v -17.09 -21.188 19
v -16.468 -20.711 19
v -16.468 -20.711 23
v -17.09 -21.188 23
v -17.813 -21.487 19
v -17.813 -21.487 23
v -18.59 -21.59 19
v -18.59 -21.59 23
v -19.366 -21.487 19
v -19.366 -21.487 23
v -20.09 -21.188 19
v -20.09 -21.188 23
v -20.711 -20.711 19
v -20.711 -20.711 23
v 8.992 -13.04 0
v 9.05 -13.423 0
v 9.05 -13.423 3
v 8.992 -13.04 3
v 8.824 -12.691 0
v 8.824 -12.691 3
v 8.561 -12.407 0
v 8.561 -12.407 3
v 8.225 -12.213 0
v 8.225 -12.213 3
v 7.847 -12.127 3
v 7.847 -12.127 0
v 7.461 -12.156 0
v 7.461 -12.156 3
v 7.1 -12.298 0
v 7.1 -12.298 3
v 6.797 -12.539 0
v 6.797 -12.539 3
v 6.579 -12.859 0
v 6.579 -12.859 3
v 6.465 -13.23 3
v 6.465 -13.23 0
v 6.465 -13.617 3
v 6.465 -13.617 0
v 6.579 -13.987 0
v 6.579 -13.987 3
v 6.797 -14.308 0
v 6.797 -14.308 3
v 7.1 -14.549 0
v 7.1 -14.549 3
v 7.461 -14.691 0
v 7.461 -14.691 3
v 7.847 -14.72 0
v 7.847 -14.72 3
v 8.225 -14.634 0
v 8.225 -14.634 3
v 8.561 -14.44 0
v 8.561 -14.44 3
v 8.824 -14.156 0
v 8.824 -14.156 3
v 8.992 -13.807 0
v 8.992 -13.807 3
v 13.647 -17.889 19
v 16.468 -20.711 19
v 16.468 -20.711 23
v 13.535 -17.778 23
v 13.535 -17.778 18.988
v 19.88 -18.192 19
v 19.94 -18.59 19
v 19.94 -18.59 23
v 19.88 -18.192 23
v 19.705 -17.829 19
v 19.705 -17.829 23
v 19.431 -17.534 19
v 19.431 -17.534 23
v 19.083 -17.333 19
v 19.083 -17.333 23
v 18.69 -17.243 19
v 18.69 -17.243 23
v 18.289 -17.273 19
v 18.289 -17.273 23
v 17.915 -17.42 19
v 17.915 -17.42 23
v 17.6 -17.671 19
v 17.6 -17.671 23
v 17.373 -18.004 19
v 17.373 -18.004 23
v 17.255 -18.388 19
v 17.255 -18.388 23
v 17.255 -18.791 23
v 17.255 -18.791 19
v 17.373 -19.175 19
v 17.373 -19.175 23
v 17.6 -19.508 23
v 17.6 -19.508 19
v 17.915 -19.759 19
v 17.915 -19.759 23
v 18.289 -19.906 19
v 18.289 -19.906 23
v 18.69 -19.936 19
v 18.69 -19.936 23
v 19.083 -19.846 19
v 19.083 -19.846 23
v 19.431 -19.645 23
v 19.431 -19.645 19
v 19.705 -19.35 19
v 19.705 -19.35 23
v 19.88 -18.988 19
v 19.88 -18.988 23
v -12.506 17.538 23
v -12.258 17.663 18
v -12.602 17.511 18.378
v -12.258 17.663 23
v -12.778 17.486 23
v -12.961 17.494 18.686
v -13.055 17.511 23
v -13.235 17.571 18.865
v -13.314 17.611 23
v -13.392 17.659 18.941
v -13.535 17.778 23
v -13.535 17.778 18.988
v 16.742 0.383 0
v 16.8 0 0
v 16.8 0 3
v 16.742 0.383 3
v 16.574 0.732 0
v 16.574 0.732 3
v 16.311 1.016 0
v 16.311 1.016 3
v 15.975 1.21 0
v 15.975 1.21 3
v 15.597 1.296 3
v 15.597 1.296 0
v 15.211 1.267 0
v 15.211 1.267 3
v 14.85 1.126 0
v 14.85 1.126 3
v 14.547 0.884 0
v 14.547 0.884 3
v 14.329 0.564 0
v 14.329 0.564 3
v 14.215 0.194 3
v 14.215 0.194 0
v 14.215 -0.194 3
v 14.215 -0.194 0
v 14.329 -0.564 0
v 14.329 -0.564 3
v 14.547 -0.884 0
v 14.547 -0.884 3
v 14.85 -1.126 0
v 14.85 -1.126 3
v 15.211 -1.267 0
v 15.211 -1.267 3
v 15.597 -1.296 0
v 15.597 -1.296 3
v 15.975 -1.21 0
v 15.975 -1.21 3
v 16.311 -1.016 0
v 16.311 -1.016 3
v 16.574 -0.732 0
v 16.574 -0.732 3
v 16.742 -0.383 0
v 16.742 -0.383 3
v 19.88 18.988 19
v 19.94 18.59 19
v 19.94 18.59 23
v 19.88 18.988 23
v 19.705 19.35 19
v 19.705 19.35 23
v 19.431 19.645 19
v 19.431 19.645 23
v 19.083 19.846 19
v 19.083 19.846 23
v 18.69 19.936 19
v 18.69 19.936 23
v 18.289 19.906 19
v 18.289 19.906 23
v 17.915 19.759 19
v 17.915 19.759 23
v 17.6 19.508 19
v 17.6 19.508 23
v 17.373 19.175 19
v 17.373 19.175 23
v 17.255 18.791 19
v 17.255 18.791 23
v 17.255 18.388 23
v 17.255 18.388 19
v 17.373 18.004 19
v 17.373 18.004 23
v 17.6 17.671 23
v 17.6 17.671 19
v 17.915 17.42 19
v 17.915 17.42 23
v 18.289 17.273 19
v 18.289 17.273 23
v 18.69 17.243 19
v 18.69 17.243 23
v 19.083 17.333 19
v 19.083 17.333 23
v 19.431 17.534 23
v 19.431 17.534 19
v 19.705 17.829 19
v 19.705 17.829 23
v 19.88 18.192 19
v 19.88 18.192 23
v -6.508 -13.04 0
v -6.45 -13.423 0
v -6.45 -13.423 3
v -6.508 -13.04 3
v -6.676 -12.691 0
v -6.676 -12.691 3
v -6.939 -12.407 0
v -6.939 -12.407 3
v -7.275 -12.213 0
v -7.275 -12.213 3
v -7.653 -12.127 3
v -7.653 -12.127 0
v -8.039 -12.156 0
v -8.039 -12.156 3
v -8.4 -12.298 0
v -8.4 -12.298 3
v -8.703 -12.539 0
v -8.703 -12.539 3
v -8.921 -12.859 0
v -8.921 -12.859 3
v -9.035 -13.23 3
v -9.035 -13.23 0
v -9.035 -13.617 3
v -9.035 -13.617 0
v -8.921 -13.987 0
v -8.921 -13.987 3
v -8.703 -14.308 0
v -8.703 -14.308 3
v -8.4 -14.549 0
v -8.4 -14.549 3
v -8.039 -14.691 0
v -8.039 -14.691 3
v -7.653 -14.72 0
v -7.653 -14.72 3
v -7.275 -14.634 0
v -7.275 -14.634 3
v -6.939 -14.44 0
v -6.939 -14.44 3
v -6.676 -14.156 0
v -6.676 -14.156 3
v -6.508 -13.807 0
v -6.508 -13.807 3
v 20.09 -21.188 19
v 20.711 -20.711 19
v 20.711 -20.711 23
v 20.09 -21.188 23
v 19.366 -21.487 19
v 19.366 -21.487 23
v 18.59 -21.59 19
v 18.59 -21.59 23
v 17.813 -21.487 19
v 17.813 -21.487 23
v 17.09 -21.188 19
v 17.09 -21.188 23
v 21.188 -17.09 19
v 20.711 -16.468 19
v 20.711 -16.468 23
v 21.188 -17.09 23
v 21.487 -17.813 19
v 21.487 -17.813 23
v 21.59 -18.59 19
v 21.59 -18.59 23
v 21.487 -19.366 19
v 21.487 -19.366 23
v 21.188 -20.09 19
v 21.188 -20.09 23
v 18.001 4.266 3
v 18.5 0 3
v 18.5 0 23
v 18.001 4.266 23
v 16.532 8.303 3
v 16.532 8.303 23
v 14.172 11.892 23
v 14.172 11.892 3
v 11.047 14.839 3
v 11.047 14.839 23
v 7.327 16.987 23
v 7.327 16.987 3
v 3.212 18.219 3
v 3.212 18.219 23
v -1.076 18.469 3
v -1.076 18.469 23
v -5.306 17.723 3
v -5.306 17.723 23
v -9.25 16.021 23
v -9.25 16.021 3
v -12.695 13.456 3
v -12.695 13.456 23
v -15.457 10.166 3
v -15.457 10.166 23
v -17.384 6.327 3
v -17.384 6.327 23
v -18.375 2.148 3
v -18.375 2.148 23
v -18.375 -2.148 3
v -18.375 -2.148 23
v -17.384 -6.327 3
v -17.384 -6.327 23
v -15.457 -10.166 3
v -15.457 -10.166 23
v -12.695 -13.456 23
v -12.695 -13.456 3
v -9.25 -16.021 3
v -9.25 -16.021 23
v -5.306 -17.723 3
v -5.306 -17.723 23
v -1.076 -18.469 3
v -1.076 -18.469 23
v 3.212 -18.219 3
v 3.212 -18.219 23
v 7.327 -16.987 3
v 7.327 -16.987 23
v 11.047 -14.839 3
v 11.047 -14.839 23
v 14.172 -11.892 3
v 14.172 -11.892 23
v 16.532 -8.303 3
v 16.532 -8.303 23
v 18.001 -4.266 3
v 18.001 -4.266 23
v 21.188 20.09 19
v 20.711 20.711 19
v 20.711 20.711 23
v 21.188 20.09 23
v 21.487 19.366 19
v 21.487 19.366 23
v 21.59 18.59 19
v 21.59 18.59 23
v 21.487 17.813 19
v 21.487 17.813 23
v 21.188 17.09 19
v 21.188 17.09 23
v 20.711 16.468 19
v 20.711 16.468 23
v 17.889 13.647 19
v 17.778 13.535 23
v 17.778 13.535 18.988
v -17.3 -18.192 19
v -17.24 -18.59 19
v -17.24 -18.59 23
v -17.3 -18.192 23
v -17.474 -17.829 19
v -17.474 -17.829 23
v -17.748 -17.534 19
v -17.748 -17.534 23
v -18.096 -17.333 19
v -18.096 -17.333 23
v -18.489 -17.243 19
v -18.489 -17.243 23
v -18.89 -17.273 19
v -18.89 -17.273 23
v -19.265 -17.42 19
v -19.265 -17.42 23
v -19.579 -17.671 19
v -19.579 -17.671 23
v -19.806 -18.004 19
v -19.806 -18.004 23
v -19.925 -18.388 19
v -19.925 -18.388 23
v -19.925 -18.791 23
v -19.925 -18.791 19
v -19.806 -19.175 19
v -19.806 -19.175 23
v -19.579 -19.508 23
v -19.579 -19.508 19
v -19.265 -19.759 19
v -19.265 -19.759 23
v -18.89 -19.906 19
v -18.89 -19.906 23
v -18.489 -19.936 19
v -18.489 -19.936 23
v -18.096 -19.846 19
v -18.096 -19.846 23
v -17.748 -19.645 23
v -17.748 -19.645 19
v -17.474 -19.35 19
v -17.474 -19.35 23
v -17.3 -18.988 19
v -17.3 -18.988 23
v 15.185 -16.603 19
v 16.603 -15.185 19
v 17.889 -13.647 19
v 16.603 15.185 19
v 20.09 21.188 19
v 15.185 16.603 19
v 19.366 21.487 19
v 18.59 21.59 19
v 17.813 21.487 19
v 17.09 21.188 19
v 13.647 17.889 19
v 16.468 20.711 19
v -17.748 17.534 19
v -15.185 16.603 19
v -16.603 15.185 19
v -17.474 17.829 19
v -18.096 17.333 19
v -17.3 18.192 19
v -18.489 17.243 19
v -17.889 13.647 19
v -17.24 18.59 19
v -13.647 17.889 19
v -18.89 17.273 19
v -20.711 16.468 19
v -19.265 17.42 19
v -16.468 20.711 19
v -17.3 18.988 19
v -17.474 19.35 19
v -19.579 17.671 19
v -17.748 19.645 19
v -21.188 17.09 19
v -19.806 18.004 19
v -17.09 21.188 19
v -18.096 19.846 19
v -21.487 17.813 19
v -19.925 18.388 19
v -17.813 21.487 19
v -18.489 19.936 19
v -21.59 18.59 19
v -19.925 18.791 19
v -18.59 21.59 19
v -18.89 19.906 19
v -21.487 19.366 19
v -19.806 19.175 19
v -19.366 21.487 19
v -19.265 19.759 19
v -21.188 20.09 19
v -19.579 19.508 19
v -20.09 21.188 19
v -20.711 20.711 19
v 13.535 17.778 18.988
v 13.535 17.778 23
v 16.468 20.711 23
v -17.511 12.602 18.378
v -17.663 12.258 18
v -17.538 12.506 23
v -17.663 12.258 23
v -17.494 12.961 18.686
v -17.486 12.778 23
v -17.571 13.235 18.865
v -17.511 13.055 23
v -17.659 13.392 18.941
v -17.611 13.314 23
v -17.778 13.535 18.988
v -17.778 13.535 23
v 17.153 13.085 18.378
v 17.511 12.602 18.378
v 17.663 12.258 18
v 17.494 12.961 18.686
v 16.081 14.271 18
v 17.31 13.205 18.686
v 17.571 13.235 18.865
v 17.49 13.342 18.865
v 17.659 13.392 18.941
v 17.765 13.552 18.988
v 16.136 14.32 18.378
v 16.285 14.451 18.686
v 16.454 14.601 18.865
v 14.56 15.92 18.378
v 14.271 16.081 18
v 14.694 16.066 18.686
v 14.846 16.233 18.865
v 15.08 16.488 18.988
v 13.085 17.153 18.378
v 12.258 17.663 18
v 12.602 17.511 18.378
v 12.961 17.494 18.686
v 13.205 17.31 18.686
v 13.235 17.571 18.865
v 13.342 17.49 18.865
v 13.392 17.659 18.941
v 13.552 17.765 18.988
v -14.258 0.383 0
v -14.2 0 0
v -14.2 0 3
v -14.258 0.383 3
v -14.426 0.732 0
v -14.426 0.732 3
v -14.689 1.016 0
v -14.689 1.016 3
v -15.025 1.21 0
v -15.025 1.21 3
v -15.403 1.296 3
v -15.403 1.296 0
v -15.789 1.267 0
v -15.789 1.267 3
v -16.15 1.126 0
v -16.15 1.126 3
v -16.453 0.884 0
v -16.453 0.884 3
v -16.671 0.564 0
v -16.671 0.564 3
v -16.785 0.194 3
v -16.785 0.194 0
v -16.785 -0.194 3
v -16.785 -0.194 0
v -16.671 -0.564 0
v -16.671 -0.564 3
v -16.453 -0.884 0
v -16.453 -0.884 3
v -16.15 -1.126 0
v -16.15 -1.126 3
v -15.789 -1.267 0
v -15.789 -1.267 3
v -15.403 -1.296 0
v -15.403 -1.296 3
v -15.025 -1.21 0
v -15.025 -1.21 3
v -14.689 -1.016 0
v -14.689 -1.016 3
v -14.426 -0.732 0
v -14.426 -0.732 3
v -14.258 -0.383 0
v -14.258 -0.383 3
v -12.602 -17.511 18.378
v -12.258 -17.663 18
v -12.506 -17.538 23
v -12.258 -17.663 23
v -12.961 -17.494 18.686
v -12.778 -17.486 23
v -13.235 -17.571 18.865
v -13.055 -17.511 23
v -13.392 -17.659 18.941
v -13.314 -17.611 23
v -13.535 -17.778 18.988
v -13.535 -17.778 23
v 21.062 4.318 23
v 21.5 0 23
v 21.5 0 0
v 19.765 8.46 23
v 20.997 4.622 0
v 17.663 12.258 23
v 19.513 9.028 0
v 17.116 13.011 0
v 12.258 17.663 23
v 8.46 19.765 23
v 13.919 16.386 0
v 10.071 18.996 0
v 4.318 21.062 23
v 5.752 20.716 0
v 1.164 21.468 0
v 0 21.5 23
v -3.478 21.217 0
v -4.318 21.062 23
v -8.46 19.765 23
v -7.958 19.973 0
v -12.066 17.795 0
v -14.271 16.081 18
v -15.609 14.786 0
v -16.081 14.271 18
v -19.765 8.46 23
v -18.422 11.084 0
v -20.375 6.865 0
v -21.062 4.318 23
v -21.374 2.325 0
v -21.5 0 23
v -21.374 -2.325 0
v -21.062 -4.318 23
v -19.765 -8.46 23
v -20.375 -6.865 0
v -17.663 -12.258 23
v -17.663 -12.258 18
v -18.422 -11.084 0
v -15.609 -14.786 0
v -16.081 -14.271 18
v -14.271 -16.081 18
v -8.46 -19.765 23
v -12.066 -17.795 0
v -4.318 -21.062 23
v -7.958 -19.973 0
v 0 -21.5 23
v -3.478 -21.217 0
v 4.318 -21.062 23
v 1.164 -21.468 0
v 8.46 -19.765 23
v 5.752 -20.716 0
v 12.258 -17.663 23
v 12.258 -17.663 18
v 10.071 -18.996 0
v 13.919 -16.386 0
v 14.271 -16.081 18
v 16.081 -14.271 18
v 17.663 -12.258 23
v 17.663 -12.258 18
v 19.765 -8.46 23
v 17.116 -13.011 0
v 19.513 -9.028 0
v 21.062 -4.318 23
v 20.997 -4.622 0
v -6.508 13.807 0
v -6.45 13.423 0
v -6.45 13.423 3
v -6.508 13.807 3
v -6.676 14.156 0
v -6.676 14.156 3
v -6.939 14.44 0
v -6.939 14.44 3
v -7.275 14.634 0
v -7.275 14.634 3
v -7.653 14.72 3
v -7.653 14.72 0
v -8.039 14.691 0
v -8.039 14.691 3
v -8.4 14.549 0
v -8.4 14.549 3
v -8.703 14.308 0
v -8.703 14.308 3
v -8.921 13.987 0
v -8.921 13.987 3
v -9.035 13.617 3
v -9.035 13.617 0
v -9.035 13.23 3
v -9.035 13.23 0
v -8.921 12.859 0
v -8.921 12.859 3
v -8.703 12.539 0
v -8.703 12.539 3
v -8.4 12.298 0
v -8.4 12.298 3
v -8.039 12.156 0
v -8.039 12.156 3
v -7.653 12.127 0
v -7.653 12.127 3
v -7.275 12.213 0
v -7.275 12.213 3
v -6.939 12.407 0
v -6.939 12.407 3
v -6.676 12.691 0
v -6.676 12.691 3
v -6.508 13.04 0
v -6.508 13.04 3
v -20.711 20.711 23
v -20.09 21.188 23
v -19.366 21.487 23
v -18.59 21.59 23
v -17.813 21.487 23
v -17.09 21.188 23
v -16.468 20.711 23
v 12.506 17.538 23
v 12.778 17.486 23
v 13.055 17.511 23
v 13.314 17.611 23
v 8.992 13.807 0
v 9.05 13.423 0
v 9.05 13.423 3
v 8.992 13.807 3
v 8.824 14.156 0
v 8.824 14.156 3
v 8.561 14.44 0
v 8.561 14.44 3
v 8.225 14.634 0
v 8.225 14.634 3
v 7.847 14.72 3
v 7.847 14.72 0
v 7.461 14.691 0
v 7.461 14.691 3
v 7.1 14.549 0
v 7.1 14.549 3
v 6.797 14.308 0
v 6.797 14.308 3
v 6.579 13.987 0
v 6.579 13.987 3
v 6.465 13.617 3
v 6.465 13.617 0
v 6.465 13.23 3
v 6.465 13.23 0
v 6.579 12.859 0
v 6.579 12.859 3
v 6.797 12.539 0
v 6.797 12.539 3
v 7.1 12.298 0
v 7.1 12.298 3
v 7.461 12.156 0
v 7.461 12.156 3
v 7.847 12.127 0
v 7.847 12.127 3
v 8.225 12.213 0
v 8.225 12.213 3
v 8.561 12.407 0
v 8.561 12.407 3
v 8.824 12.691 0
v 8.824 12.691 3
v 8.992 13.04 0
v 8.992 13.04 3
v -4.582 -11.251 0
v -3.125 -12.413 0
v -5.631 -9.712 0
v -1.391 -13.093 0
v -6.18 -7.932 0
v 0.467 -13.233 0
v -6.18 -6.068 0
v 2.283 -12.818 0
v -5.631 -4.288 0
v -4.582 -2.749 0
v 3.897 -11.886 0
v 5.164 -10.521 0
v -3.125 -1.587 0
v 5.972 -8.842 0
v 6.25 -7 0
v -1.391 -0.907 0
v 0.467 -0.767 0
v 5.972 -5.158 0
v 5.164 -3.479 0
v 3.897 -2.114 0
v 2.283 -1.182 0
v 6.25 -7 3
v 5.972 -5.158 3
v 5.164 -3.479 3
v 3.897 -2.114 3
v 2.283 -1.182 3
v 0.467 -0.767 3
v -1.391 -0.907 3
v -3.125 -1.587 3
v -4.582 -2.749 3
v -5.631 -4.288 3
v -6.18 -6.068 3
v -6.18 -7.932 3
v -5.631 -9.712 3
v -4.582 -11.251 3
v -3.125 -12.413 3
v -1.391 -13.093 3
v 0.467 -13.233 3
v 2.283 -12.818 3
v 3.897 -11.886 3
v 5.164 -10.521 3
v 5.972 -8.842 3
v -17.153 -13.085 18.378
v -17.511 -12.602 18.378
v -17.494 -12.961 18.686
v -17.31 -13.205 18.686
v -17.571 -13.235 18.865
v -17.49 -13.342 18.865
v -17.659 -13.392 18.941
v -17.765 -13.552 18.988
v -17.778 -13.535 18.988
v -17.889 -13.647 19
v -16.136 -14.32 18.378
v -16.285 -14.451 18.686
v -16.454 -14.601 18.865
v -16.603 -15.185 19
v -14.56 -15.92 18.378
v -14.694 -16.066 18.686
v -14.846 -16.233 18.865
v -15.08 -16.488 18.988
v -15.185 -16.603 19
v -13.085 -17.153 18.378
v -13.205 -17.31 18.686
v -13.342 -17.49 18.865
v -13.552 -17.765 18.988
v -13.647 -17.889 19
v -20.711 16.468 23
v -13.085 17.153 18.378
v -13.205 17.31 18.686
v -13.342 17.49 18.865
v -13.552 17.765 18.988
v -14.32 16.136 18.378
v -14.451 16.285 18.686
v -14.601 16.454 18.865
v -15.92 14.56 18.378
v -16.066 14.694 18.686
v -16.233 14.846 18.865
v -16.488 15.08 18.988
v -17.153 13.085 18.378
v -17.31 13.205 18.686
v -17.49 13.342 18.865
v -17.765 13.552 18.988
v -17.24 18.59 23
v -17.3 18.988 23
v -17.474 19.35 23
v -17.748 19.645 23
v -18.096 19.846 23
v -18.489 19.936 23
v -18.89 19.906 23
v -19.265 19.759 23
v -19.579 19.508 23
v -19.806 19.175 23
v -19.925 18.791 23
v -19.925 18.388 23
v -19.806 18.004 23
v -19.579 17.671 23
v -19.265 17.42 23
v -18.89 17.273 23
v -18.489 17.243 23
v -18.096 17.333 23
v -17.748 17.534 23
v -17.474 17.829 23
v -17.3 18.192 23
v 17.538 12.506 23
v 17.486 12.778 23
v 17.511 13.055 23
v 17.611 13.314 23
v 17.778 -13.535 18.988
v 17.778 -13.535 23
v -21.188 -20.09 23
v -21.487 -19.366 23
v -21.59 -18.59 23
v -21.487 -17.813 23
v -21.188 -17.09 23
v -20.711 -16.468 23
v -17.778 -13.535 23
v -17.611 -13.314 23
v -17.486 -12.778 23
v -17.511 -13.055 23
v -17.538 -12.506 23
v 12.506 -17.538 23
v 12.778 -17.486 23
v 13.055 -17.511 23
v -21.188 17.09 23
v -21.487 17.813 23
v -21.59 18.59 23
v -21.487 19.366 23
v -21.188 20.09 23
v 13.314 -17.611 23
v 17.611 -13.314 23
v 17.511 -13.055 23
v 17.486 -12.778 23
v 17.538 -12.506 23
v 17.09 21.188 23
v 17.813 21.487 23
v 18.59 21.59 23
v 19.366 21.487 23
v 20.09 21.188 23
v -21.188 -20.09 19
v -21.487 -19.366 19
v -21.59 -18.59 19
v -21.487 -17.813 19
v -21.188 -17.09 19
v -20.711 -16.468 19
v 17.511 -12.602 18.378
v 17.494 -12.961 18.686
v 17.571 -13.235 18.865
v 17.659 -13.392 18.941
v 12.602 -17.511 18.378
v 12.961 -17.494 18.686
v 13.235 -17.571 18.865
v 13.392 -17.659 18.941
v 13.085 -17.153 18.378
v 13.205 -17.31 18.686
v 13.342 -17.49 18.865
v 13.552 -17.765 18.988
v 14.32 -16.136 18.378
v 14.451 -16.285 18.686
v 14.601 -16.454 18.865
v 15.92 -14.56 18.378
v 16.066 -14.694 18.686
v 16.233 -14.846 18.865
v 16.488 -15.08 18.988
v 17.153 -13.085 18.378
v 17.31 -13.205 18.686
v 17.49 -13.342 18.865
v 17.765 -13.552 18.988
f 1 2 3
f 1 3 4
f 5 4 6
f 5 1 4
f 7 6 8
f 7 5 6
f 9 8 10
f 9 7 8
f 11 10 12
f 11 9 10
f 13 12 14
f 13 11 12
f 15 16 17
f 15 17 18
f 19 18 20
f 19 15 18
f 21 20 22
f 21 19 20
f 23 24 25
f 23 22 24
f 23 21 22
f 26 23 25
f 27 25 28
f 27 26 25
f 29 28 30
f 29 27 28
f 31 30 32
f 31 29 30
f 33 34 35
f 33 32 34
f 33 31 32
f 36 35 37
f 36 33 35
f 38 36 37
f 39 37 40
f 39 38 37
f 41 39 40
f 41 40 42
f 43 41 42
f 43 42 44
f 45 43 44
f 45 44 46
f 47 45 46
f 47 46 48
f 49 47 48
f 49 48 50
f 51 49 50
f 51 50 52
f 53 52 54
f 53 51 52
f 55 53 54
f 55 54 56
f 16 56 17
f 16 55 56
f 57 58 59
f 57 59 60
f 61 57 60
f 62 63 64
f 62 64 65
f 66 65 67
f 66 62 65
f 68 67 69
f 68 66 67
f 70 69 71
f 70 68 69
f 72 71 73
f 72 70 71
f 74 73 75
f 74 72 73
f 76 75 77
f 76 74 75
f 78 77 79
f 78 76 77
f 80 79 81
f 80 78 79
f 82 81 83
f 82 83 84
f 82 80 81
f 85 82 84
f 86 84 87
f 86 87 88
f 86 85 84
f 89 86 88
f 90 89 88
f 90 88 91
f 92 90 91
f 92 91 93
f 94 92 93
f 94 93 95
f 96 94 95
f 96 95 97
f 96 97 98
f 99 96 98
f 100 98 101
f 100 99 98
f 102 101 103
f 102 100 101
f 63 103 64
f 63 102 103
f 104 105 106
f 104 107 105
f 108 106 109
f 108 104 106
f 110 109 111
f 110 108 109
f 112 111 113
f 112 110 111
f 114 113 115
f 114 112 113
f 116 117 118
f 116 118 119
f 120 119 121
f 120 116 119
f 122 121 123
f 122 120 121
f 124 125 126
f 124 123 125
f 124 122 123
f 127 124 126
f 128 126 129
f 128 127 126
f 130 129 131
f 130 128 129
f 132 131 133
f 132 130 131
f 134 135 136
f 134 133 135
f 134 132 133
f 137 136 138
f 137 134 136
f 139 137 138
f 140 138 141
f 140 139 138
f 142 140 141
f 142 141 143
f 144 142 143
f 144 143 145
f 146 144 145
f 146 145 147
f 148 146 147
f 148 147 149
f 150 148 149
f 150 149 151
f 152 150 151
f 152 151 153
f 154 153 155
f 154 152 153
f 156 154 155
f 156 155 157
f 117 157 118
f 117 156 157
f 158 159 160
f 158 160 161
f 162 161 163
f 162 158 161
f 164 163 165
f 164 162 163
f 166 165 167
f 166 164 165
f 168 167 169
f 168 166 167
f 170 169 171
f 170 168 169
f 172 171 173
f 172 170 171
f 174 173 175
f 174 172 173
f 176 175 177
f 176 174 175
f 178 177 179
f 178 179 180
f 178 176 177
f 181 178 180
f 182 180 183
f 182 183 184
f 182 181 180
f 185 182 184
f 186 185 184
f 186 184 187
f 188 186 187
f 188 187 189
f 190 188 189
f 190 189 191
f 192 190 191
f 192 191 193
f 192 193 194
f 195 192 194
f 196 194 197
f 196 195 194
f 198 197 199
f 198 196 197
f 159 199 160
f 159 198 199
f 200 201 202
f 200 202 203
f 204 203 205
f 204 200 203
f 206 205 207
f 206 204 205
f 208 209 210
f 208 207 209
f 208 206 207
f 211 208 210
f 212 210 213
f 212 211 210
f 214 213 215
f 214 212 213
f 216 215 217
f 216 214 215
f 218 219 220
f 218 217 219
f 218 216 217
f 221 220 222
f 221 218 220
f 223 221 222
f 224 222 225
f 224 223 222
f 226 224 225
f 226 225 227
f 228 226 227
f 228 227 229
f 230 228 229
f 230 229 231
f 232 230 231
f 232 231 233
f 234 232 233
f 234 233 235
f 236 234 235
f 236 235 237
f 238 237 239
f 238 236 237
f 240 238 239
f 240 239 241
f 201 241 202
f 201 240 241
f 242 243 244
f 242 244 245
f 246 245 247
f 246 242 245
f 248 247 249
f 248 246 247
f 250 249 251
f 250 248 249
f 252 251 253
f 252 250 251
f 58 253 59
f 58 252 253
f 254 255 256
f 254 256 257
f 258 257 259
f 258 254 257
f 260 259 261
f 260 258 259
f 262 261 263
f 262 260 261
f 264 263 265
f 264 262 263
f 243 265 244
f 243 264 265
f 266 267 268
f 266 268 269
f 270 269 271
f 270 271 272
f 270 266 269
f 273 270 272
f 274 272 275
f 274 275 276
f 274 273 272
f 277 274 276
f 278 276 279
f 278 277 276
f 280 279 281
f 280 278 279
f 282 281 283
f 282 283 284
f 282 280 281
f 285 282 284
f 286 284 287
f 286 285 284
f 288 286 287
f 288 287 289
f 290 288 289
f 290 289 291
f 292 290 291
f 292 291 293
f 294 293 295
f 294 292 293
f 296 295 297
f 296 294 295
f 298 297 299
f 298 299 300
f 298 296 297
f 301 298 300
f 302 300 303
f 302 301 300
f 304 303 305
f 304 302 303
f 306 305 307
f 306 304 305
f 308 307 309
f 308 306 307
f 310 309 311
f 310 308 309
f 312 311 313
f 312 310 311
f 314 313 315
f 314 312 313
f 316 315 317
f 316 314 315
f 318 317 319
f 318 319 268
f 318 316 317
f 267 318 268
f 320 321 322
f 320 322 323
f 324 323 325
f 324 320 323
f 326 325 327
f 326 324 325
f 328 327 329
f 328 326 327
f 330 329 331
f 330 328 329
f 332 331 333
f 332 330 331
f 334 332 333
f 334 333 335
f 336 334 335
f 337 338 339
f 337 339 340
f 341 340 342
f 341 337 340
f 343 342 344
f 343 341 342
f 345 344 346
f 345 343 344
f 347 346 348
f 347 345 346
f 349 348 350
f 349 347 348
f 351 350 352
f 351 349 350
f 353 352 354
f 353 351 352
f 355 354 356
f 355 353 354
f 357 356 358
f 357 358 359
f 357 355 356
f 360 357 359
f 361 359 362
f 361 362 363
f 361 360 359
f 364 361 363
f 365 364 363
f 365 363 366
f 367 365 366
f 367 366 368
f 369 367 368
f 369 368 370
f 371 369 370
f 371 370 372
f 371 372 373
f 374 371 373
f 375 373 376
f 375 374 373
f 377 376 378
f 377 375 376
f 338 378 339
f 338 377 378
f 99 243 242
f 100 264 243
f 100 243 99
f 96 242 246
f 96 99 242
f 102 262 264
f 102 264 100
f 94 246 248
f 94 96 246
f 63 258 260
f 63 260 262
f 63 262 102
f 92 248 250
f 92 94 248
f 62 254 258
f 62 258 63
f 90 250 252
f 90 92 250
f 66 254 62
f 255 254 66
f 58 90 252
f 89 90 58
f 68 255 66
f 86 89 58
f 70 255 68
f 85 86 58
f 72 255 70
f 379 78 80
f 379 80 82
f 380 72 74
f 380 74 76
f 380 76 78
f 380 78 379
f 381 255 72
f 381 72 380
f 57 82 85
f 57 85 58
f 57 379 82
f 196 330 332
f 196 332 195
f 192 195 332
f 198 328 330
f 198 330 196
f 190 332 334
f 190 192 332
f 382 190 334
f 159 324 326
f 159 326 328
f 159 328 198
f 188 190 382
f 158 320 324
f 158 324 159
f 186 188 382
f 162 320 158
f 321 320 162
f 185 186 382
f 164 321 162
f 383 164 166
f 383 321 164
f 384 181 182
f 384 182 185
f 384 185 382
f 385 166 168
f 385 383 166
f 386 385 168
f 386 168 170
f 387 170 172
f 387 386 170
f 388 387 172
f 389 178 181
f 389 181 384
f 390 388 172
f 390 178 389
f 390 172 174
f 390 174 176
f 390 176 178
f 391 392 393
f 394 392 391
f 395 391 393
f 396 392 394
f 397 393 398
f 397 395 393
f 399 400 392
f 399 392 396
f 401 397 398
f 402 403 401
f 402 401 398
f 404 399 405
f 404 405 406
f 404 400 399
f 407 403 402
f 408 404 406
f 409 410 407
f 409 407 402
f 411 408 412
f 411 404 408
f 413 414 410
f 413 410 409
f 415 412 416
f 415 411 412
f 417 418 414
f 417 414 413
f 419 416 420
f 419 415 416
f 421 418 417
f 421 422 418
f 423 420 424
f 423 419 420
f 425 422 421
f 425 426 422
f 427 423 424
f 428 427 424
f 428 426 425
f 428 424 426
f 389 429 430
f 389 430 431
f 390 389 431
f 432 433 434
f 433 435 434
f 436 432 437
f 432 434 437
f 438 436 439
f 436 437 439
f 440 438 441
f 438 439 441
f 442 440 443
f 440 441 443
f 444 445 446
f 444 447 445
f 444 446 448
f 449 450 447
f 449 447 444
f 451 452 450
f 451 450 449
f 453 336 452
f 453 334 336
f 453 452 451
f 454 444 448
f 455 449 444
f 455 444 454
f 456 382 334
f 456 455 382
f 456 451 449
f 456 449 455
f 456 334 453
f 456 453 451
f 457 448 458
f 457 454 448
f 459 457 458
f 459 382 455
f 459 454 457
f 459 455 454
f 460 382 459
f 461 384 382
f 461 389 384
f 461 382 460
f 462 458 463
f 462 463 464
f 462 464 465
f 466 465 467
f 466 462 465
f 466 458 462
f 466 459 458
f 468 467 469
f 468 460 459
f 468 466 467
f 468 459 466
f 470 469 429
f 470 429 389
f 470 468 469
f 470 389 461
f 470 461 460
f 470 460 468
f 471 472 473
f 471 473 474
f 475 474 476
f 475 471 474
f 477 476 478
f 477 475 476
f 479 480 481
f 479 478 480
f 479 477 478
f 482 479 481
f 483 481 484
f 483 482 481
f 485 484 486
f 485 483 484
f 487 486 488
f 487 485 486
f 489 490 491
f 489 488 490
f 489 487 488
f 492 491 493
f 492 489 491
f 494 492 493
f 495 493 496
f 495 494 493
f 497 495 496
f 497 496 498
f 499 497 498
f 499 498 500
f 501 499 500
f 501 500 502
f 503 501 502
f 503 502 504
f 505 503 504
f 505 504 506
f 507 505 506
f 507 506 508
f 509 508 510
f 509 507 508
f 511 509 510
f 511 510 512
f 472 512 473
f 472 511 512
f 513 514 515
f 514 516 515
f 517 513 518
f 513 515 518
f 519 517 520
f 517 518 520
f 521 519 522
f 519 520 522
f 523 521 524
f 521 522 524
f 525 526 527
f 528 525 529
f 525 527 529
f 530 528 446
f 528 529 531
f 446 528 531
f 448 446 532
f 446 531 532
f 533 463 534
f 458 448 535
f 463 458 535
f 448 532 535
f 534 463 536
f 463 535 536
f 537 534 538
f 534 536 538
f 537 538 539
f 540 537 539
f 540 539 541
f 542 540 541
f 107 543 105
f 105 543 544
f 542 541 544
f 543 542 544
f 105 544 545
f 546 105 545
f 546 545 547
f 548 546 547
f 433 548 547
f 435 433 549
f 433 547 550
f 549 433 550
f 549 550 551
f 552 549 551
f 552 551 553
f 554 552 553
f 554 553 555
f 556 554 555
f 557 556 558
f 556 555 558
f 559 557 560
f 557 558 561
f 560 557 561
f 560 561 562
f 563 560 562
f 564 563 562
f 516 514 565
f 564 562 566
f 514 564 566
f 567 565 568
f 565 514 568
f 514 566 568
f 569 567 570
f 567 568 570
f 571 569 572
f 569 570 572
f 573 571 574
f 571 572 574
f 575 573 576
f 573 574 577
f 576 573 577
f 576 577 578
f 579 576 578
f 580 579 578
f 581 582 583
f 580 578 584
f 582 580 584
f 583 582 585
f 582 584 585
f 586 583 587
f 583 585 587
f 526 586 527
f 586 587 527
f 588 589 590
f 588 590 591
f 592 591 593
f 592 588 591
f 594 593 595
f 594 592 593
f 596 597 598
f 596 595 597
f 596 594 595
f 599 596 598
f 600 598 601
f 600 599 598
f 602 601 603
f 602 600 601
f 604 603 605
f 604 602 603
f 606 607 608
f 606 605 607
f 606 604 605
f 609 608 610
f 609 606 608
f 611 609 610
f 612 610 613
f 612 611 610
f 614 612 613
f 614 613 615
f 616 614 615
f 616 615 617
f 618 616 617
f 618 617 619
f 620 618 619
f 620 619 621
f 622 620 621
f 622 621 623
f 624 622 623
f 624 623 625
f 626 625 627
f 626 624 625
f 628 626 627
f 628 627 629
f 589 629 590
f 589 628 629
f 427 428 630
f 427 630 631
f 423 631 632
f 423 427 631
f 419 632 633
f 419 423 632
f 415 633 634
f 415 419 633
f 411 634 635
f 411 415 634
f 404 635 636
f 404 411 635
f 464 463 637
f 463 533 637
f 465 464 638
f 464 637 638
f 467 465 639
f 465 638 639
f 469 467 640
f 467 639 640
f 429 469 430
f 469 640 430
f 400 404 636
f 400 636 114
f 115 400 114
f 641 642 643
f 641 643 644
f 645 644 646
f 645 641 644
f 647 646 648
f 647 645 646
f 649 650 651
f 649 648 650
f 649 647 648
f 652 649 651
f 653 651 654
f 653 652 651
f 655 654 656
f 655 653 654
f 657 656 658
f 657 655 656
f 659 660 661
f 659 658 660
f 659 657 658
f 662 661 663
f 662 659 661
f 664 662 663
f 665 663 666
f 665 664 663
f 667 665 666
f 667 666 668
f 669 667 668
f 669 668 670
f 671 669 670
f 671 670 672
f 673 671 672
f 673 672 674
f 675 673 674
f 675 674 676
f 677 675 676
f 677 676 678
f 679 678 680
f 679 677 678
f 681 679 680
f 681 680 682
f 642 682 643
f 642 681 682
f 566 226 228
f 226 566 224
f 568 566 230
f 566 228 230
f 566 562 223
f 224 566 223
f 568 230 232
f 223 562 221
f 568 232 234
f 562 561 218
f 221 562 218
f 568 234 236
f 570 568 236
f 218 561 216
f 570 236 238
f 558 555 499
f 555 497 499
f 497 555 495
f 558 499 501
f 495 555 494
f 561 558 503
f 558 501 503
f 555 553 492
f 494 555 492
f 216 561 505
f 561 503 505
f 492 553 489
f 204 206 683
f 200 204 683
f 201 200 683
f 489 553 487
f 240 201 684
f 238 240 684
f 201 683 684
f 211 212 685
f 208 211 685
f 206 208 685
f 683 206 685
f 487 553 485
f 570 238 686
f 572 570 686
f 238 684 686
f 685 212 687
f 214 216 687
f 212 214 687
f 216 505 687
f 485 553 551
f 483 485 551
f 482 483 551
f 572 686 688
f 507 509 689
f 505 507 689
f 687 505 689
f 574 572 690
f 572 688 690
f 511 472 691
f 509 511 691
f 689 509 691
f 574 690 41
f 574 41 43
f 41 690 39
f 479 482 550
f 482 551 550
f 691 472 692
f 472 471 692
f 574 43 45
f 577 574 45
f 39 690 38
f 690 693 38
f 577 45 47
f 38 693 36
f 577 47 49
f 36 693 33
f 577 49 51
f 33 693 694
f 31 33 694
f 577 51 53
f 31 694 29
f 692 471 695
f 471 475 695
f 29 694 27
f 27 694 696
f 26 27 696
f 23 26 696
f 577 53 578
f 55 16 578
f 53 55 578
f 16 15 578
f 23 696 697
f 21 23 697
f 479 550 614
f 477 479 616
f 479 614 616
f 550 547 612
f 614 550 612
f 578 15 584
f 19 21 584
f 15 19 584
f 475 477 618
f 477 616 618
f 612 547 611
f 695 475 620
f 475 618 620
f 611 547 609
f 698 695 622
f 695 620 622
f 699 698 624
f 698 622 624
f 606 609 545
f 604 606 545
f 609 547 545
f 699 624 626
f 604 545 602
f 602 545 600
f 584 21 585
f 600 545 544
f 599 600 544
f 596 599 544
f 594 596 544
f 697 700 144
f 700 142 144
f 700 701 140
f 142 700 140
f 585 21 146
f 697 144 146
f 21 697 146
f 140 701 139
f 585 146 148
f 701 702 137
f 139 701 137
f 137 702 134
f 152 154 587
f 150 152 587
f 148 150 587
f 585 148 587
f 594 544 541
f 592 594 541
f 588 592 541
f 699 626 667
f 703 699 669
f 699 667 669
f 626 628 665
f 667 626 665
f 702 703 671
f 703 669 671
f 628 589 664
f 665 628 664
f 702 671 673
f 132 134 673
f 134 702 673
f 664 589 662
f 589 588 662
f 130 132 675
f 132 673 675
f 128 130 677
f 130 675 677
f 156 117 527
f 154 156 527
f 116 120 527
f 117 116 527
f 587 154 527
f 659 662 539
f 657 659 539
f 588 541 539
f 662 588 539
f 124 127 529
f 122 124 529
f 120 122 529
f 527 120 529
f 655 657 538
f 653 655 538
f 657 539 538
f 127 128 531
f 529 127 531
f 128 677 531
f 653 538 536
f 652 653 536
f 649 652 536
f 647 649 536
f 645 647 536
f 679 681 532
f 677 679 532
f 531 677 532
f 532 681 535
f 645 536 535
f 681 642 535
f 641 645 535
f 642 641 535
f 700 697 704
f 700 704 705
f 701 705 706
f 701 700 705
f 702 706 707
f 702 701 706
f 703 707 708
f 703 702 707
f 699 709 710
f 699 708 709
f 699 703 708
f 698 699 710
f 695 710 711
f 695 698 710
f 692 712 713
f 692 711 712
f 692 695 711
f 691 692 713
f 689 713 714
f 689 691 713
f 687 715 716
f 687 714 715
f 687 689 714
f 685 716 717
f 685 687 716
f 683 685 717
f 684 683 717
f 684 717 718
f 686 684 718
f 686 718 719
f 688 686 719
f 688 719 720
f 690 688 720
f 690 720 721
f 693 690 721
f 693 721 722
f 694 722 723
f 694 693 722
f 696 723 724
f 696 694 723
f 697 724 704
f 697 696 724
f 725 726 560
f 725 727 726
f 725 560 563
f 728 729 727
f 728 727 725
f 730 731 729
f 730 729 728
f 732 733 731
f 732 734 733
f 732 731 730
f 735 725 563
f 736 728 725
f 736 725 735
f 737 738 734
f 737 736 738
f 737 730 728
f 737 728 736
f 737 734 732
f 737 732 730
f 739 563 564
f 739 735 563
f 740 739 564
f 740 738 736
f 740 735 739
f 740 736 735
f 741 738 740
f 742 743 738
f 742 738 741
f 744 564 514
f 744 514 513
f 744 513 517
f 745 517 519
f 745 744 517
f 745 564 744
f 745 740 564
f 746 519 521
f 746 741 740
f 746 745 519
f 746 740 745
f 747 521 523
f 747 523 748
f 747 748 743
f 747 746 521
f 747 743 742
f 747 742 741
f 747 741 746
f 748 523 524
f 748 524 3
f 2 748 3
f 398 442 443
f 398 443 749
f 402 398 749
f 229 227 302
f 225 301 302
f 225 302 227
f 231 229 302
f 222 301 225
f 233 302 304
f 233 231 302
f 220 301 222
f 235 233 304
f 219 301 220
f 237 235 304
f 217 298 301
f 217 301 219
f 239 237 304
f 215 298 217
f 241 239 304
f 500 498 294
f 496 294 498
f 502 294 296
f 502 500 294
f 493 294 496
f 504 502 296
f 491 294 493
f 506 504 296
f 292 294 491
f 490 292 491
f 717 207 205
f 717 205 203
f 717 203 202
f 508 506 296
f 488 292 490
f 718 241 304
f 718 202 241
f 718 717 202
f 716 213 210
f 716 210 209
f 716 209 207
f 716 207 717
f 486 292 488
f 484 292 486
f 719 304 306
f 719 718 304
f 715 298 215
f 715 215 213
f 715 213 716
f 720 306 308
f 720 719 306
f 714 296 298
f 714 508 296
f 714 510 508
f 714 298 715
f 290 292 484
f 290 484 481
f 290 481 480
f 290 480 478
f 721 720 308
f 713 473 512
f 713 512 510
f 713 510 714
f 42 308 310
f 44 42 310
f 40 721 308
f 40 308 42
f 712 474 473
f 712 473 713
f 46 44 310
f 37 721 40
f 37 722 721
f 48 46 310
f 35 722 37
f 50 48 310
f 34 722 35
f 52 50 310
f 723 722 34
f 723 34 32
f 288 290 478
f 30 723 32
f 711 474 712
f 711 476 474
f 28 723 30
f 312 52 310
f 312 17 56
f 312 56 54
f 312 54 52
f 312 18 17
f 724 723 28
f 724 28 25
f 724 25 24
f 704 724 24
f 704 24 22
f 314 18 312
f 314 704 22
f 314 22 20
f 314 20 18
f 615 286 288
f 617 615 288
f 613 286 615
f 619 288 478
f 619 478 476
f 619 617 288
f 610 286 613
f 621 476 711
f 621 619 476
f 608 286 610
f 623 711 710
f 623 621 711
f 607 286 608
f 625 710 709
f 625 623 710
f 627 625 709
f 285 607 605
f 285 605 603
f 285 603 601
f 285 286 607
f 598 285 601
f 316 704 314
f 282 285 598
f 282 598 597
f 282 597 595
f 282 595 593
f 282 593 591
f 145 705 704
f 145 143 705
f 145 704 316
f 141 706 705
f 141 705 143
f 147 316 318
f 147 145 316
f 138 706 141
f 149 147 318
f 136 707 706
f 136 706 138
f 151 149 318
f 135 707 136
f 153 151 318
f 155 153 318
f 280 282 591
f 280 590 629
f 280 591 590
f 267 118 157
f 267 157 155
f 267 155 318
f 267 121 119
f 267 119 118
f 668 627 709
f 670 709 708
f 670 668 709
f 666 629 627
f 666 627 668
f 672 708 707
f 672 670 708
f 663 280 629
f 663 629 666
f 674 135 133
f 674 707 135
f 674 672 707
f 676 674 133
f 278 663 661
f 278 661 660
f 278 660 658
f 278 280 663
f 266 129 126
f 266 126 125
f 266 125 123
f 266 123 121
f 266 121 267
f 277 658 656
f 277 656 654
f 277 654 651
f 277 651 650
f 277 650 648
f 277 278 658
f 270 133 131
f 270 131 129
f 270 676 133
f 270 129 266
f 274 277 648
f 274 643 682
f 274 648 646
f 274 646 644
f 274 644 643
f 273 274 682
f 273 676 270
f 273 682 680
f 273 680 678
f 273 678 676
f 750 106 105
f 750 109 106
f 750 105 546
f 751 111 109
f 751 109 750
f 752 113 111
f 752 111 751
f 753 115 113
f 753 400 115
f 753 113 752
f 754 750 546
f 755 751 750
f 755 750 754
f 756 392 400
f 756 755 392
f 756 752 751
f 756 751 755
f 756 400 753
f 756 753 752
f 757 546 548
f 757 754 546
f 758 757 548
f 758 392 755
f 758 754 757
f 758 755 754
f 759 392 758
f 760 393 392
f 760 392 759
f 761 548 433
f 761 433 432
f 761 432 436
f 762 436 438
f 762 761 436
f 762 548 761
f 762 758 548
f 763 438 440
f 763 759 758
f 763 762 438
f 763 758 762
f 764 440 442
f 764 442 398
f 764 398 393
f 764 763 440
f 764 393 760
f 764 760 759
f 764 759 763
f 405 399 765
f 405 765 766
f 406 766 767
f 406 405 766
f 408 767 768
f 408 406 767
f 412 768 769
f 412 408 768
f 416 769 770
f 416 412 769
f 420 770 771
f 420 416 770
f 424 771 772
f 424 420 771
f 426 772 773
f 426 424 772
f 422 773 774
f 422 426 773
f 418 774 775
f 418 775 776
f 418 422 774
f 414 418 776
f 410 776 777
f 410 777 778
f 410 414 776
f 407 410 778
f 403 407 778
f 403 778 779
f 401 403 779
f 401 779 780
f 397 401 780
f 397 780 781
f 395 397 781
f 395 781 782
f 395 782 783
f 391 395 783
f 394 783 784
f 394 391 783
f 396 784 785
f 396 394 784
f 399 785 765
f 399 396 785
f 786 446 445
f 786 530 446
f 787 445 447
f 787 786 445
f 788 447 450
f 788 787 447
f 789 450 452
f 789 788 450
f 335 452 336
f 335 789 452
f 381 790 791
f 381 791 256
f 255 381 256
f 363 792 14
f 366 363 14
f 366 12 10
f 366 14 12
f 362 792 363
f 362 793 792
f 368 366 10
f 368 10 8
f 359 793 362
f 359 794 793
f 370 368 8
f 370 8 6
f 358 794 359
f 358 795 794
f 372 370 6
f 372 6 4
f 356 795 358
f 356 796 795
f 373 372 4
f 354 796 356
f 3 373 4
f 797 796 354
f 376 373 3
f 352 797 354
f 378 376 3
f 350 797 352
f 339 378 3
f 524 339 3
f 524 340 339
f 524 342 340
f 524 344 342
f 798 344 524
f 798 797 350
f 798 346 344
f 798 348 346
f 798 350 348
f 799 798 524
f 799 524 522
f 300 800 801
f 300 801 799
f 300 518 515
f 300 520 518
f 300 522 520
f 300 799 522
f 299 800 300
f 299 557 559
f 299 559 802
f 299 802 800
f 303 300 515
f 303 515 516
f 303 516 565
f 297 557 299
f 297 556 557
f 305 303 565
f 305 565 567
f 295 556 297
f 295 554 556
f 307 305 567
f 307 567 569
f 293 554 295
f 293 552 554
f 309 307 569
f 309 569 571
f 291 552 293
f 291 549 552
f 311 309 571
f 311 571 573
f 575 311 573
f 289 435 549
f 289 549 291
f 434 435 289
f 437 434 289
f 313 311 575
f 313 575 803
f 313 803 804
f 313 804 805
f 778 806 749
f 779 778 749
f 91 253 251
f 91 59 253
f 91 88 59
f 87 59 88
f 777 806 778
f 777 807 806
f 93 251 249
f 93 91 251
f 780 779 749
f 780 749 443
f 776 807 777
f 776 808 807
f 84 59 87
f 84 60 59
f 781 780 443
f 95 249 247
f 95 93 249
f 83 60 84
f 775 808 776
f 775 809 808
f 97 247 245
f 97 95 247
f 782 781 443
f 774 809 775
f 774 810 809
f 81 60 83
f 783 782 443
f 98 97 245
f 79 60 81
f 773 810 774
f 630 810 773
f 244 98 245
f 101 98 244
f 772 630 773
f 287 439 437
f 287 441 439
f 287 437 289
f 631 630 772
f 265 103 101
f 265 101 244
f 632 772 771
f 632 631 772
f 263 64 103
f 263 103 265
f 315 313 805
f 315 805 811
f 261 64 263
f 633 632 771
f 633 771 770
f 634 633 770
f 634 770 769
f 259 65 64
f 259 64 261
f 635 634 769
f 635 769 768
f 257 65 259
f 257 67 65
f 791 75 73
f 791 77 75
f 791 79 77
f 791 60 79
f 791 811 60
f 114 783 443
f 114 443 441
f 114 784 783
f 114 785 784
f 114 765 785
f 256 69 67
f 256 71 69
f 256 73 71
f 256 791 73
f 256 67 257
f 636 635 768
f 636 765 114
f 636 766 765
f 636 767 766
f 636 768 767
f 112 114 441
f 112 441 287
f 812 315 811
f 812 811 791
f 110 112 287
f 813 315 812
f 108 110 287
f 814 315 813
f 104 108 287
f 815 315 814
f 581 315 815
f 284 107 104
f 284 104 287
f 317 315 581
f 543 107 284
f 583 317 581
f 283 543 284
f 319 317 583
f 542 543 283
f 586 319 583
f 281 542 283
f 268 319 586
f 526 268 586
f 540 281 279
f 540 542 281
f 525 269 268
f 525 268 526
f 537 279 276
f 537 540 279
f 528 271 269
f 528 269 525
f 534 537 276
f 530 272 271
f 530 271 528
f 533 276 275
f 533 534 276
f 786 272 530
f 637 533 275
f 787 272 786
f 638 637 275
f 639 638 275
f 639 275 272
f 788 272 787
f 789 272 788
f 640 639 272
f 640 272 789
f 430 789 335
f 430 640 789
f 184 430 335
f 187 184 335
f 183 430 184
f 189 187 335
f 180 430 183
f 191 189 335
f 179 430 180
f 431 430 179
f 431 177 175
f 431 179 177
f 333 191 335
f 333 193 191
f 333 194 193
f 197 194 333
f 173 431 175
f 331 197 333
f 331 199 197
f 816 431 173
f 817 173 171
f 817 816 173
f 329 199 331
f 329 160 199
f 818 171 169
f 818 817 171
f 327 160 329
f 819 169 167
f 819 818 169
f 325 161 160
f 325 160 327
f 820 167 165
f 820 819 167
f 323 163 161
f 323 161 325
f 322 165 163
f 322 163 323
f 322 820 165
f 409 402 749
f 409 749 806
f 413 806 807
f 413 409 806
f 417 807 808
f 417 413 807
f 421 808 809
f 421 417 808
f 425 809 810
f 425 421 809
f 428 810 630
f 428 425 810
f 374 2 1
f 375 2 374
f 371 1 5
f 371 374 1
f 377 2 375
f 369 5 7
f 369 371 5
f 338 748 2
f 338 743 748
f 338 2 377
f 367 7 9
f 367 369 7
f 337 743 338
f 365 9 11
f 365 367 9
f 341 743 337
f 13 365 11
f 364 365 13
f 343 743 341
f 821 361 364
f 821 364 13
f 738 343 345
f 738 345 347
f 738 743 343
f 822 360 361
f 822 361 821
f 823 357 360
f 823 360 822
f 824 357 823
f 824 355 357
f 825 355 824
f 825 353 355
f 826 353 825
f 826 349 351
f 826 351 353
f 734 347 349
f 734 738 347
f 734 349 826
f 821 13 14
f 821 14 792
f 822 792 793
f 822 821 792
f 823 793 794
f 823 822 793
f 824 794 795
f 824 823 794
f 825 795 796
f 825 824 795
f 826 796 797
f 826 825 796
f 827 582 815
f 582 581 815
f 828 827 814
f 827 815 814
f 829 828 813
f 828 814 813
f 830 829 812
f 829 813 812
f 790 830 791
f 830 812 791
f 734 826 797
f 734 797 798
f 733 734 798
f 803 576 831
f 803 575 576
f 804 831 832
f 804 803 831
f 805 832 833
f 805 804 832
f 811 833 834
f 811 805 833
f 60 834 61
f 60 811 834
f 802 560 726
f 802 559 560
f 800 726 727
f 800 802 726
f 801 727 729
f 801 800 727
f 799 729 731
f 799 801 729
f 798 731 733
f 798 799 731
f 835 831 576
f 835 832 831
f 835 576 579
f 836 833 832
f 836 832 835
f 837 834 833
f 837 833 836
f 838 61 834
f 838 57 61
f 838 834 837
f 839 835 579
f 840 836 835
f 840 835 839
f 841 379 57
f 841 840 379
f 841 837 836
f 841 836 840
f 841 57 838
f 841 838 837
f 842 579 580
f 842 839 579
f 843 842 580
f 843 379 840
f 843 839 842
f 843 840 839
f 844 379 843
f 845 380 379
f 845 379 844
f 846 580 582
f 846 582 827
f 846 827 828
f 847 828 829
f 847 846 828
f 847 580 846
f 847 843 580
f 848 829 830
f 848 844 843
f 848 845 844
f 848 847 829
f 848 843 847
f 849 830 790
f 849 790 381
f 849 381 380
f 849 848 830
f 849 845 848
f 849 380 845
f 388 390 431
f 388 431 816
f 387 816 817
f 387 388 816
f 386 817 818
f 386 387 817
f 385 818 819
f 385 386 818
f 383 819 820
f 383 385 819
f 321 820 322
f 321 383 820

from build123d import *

# Parameters (mm, degrees)
SKETCH1_R               = 21.5
BOSS_EXTRUDE1_DEPTH     = 3
BOSS_EXTRUDE2_START     = 3
SKETCH1_3_R             = 21.5
SKETCH1_3_R_2           = 18.5
BOSS_EXTRUDE2_DEPTH     = 20
CUT_EXTRUDE1_DEPTH      = 39.124795081
CUT_EXTRUDE1_DEPTH_BACK = 39.124795081
SKETCH3_R               = 6.25
SKETCH3_R_2             = 1.3
BOSS_EXTRUDE3_START     = 19
SKETCH4_R               = 1.35
BOSS_EXTRUDE3_DEPTH     = 4
FILLET1_R               = 1


with BuildPart() as part:
    # Sketch1 → Boss-Extrude1 (new body)
    with BuildSketch(Plane.XY):
        Circle(SKETCH1_R)
    extrude(amount=BOSS_EXTRUDE1_DEPTH)

    # Sketch1<3> → Boss-Extrude2 (add)
    with BuildSketch(Plane.XY.offset(BOSS_EXTRUDE2_START)):
        Circle(SKETCH1_3_R)
        Circle(SKETCH1_3_R_2, mode=Mode.SUBTRACT)
    extrude(amount=BOSS_EXTRUDE2_DEPTH)

    # Sketch3 → Cut-Extrude1 (cut, two sides: drawn at the far end of the back side and taken through both)
    with BuildSketch(Plane.XY.offset(-CUT_EXTRUDE1_DEPTH_BACK)):
        with Locations((0, -7)):
            Circle(SKETCH3_R)
        with Locations((7.75, 13.423393759)):
            Circle(SKETCH3_R_2)
        with Locations((-7.75, 13.423393759)):
            Circle(SKETCH3_R_2)
        with Locations((15.5, 0)):
            Circle(SKETCH3_R_2)
        with Locations((-15.5, 0)):
            Circle(SKETCH3_R_2)
        with Locations((7.75, -13.423393759)):
            Circle(SKETCH3_R_2)
        with Locations((-7.75, -13.423393759)):
            Circle(SKETCH3_R_2)
    extrude(amount=CUT_EXTRUDE1_DEPTH + CUT_EXTRUDE1_DEPTH_BACK, mode=Mode.SUBTRACT)

    # Sketch4 → Boss-Extrude3 (add)
    # profile 1 of 4: a face of its own
    with BuildSketch(Plane.XY.offset(BOSS_EXTRUDE3_START)):
        with BuildLine():
            Line((-17.175389561, 12.932748874), (-20.710923467, 16.46828278))
            ThreePointArc((-20.710923467, 16.46828278), (-21.589603123, 18.589603123), (-20.710923467, 20.710923467))
            ThreePointArc((-20.710923467, 20.710923467), (-18.589603123, 21.589603123), (-16.46828278, 20.710923467))
            Line((-16.46828278, 20.710923467), (-12.932748874, 17.175389561))
            ThreePointArc((-12.932748874, 17.175389561), (-15.202795796, 15.202795796), (-17.175389561, 12.932748874))
        make_face()
        with Locations((-18.589603123, 18.589603123)):
            Circle(SKETCH4_R, mode=Mode.SUBTRACT)
    # profile 2 of 4: a face of its own
    with BuildSketch(Plane.XY.offset(BOSS_EXTRUDE3_START)):
        with BuildLine():
            Line((12.932748874, 17.175389561), (16.46828278, 20.710923467))
            ThreePointArc((16.46828278, 20.710923467), (18.589603123, 21.589603123), (20.710923467, 20.710923467))
            ThreePointArc((20.710923467, 20.710923467), (21.589603123, 18.589603123), (20.710923467, 16.46828278))
            Line((20.710923467, 16.46828278), (17.175389561, 12.932748874))
            ThreePointArc((17.175389561, 12.932748874), (15.202795796, 15.202795796), (12.932748874, 17.175389561))
        make_face()
        with Locations((18.589603123, 18.589603123)):
            Circle(SKETCH4_R, mode=Mode.SUBTRACT)
    # profile 3 of 4: a face of its own
    with BuildSketch(Plane.XY.offset(BOSS_EXTRUDE3_START)):
        with BuildLine():
            Line((17.175389561, -12.932748874), (20.710923467, -16.46828278))
            ThreePointArc((20.710923467, -16.46828278), (21.589603123, -18.589603123), (20.710923467, -20.710923467))
            ThreePointArc((20.710923467, -20.710923467), (18.589603123, -21.589603123), (16.46828278, -20.710923467))
            Line((16.46828278, -20.710923467), (12.932748874, -17.175389561))
            ThreePointArc((12.932748874, -17.175389561), (15.202795796, -15.202795796), (17.175389561, -12.932748874))
        make_face()
        with Locations((18.589603123, -18.589603123)):
            Circle(SKETCH4_R, mode=Mode.SUBTRACT)
    # profile 4 of 4: a face of its own
    with BuildSketch(Plane.XY.offset(BOSS_EXTRUDE3_START)):
        with BuildLine():
            Line((-12.932748874, -17.175389561), (-16.46828278, -20.710923467))
            ThreePointArc((-16.46828278, -20.710923467), (-18.589603123, -21.589603123), (-20.710923467, -20.710923467))
            ThreePointArc((-20.710923467, -20.710923467), (-21.589603123, -18.589603123), (-20.710923467, -16.46828278))
            Line((-20.710923467, -16.46828278), (-17.175389561, -12.932748874))
            ThreePointArc((-17.175389561, -12.932748874), (-15.202795796, -15.202795796), (-12.932748874, -17.175389561))
        make_face()
        with Locations((-18.589603123, -18.589603123)):
            Circle(SKETCH4_R, mode=Mode.SUBTRACT)
    extrude(amount=BOSS_EXTRUDE3_DEPTH)

    # Fillet1
    fillet1_edges = [part.edges().sort_by_distance(p)[0] for p in [
        (-17.175389561, -12.932748874, 21),
        (-12.932748874, -17.175389561, 21),
        (-15.202795796, -15.202795796, 19),
        (-12.932748874, 17.175389561, 21),
        (-17.175389561, 12.932748874, 21),
        (-15.202795796, 15.202795796, 19),
        (17.175389561, 12.932748874, 21),
        (12.932748874, 17.175389561, 21),
        (15.202795796, 15.202795796, 19),
        (12.932748874, -17.175389561, 21),
        (17.175389561, -12.932748874, 21),
        (15.202795796, -15.202795796, 19),
    ]]
    fillet(fillet1_edges, radius=FILLET1_R)


solid = part.part
